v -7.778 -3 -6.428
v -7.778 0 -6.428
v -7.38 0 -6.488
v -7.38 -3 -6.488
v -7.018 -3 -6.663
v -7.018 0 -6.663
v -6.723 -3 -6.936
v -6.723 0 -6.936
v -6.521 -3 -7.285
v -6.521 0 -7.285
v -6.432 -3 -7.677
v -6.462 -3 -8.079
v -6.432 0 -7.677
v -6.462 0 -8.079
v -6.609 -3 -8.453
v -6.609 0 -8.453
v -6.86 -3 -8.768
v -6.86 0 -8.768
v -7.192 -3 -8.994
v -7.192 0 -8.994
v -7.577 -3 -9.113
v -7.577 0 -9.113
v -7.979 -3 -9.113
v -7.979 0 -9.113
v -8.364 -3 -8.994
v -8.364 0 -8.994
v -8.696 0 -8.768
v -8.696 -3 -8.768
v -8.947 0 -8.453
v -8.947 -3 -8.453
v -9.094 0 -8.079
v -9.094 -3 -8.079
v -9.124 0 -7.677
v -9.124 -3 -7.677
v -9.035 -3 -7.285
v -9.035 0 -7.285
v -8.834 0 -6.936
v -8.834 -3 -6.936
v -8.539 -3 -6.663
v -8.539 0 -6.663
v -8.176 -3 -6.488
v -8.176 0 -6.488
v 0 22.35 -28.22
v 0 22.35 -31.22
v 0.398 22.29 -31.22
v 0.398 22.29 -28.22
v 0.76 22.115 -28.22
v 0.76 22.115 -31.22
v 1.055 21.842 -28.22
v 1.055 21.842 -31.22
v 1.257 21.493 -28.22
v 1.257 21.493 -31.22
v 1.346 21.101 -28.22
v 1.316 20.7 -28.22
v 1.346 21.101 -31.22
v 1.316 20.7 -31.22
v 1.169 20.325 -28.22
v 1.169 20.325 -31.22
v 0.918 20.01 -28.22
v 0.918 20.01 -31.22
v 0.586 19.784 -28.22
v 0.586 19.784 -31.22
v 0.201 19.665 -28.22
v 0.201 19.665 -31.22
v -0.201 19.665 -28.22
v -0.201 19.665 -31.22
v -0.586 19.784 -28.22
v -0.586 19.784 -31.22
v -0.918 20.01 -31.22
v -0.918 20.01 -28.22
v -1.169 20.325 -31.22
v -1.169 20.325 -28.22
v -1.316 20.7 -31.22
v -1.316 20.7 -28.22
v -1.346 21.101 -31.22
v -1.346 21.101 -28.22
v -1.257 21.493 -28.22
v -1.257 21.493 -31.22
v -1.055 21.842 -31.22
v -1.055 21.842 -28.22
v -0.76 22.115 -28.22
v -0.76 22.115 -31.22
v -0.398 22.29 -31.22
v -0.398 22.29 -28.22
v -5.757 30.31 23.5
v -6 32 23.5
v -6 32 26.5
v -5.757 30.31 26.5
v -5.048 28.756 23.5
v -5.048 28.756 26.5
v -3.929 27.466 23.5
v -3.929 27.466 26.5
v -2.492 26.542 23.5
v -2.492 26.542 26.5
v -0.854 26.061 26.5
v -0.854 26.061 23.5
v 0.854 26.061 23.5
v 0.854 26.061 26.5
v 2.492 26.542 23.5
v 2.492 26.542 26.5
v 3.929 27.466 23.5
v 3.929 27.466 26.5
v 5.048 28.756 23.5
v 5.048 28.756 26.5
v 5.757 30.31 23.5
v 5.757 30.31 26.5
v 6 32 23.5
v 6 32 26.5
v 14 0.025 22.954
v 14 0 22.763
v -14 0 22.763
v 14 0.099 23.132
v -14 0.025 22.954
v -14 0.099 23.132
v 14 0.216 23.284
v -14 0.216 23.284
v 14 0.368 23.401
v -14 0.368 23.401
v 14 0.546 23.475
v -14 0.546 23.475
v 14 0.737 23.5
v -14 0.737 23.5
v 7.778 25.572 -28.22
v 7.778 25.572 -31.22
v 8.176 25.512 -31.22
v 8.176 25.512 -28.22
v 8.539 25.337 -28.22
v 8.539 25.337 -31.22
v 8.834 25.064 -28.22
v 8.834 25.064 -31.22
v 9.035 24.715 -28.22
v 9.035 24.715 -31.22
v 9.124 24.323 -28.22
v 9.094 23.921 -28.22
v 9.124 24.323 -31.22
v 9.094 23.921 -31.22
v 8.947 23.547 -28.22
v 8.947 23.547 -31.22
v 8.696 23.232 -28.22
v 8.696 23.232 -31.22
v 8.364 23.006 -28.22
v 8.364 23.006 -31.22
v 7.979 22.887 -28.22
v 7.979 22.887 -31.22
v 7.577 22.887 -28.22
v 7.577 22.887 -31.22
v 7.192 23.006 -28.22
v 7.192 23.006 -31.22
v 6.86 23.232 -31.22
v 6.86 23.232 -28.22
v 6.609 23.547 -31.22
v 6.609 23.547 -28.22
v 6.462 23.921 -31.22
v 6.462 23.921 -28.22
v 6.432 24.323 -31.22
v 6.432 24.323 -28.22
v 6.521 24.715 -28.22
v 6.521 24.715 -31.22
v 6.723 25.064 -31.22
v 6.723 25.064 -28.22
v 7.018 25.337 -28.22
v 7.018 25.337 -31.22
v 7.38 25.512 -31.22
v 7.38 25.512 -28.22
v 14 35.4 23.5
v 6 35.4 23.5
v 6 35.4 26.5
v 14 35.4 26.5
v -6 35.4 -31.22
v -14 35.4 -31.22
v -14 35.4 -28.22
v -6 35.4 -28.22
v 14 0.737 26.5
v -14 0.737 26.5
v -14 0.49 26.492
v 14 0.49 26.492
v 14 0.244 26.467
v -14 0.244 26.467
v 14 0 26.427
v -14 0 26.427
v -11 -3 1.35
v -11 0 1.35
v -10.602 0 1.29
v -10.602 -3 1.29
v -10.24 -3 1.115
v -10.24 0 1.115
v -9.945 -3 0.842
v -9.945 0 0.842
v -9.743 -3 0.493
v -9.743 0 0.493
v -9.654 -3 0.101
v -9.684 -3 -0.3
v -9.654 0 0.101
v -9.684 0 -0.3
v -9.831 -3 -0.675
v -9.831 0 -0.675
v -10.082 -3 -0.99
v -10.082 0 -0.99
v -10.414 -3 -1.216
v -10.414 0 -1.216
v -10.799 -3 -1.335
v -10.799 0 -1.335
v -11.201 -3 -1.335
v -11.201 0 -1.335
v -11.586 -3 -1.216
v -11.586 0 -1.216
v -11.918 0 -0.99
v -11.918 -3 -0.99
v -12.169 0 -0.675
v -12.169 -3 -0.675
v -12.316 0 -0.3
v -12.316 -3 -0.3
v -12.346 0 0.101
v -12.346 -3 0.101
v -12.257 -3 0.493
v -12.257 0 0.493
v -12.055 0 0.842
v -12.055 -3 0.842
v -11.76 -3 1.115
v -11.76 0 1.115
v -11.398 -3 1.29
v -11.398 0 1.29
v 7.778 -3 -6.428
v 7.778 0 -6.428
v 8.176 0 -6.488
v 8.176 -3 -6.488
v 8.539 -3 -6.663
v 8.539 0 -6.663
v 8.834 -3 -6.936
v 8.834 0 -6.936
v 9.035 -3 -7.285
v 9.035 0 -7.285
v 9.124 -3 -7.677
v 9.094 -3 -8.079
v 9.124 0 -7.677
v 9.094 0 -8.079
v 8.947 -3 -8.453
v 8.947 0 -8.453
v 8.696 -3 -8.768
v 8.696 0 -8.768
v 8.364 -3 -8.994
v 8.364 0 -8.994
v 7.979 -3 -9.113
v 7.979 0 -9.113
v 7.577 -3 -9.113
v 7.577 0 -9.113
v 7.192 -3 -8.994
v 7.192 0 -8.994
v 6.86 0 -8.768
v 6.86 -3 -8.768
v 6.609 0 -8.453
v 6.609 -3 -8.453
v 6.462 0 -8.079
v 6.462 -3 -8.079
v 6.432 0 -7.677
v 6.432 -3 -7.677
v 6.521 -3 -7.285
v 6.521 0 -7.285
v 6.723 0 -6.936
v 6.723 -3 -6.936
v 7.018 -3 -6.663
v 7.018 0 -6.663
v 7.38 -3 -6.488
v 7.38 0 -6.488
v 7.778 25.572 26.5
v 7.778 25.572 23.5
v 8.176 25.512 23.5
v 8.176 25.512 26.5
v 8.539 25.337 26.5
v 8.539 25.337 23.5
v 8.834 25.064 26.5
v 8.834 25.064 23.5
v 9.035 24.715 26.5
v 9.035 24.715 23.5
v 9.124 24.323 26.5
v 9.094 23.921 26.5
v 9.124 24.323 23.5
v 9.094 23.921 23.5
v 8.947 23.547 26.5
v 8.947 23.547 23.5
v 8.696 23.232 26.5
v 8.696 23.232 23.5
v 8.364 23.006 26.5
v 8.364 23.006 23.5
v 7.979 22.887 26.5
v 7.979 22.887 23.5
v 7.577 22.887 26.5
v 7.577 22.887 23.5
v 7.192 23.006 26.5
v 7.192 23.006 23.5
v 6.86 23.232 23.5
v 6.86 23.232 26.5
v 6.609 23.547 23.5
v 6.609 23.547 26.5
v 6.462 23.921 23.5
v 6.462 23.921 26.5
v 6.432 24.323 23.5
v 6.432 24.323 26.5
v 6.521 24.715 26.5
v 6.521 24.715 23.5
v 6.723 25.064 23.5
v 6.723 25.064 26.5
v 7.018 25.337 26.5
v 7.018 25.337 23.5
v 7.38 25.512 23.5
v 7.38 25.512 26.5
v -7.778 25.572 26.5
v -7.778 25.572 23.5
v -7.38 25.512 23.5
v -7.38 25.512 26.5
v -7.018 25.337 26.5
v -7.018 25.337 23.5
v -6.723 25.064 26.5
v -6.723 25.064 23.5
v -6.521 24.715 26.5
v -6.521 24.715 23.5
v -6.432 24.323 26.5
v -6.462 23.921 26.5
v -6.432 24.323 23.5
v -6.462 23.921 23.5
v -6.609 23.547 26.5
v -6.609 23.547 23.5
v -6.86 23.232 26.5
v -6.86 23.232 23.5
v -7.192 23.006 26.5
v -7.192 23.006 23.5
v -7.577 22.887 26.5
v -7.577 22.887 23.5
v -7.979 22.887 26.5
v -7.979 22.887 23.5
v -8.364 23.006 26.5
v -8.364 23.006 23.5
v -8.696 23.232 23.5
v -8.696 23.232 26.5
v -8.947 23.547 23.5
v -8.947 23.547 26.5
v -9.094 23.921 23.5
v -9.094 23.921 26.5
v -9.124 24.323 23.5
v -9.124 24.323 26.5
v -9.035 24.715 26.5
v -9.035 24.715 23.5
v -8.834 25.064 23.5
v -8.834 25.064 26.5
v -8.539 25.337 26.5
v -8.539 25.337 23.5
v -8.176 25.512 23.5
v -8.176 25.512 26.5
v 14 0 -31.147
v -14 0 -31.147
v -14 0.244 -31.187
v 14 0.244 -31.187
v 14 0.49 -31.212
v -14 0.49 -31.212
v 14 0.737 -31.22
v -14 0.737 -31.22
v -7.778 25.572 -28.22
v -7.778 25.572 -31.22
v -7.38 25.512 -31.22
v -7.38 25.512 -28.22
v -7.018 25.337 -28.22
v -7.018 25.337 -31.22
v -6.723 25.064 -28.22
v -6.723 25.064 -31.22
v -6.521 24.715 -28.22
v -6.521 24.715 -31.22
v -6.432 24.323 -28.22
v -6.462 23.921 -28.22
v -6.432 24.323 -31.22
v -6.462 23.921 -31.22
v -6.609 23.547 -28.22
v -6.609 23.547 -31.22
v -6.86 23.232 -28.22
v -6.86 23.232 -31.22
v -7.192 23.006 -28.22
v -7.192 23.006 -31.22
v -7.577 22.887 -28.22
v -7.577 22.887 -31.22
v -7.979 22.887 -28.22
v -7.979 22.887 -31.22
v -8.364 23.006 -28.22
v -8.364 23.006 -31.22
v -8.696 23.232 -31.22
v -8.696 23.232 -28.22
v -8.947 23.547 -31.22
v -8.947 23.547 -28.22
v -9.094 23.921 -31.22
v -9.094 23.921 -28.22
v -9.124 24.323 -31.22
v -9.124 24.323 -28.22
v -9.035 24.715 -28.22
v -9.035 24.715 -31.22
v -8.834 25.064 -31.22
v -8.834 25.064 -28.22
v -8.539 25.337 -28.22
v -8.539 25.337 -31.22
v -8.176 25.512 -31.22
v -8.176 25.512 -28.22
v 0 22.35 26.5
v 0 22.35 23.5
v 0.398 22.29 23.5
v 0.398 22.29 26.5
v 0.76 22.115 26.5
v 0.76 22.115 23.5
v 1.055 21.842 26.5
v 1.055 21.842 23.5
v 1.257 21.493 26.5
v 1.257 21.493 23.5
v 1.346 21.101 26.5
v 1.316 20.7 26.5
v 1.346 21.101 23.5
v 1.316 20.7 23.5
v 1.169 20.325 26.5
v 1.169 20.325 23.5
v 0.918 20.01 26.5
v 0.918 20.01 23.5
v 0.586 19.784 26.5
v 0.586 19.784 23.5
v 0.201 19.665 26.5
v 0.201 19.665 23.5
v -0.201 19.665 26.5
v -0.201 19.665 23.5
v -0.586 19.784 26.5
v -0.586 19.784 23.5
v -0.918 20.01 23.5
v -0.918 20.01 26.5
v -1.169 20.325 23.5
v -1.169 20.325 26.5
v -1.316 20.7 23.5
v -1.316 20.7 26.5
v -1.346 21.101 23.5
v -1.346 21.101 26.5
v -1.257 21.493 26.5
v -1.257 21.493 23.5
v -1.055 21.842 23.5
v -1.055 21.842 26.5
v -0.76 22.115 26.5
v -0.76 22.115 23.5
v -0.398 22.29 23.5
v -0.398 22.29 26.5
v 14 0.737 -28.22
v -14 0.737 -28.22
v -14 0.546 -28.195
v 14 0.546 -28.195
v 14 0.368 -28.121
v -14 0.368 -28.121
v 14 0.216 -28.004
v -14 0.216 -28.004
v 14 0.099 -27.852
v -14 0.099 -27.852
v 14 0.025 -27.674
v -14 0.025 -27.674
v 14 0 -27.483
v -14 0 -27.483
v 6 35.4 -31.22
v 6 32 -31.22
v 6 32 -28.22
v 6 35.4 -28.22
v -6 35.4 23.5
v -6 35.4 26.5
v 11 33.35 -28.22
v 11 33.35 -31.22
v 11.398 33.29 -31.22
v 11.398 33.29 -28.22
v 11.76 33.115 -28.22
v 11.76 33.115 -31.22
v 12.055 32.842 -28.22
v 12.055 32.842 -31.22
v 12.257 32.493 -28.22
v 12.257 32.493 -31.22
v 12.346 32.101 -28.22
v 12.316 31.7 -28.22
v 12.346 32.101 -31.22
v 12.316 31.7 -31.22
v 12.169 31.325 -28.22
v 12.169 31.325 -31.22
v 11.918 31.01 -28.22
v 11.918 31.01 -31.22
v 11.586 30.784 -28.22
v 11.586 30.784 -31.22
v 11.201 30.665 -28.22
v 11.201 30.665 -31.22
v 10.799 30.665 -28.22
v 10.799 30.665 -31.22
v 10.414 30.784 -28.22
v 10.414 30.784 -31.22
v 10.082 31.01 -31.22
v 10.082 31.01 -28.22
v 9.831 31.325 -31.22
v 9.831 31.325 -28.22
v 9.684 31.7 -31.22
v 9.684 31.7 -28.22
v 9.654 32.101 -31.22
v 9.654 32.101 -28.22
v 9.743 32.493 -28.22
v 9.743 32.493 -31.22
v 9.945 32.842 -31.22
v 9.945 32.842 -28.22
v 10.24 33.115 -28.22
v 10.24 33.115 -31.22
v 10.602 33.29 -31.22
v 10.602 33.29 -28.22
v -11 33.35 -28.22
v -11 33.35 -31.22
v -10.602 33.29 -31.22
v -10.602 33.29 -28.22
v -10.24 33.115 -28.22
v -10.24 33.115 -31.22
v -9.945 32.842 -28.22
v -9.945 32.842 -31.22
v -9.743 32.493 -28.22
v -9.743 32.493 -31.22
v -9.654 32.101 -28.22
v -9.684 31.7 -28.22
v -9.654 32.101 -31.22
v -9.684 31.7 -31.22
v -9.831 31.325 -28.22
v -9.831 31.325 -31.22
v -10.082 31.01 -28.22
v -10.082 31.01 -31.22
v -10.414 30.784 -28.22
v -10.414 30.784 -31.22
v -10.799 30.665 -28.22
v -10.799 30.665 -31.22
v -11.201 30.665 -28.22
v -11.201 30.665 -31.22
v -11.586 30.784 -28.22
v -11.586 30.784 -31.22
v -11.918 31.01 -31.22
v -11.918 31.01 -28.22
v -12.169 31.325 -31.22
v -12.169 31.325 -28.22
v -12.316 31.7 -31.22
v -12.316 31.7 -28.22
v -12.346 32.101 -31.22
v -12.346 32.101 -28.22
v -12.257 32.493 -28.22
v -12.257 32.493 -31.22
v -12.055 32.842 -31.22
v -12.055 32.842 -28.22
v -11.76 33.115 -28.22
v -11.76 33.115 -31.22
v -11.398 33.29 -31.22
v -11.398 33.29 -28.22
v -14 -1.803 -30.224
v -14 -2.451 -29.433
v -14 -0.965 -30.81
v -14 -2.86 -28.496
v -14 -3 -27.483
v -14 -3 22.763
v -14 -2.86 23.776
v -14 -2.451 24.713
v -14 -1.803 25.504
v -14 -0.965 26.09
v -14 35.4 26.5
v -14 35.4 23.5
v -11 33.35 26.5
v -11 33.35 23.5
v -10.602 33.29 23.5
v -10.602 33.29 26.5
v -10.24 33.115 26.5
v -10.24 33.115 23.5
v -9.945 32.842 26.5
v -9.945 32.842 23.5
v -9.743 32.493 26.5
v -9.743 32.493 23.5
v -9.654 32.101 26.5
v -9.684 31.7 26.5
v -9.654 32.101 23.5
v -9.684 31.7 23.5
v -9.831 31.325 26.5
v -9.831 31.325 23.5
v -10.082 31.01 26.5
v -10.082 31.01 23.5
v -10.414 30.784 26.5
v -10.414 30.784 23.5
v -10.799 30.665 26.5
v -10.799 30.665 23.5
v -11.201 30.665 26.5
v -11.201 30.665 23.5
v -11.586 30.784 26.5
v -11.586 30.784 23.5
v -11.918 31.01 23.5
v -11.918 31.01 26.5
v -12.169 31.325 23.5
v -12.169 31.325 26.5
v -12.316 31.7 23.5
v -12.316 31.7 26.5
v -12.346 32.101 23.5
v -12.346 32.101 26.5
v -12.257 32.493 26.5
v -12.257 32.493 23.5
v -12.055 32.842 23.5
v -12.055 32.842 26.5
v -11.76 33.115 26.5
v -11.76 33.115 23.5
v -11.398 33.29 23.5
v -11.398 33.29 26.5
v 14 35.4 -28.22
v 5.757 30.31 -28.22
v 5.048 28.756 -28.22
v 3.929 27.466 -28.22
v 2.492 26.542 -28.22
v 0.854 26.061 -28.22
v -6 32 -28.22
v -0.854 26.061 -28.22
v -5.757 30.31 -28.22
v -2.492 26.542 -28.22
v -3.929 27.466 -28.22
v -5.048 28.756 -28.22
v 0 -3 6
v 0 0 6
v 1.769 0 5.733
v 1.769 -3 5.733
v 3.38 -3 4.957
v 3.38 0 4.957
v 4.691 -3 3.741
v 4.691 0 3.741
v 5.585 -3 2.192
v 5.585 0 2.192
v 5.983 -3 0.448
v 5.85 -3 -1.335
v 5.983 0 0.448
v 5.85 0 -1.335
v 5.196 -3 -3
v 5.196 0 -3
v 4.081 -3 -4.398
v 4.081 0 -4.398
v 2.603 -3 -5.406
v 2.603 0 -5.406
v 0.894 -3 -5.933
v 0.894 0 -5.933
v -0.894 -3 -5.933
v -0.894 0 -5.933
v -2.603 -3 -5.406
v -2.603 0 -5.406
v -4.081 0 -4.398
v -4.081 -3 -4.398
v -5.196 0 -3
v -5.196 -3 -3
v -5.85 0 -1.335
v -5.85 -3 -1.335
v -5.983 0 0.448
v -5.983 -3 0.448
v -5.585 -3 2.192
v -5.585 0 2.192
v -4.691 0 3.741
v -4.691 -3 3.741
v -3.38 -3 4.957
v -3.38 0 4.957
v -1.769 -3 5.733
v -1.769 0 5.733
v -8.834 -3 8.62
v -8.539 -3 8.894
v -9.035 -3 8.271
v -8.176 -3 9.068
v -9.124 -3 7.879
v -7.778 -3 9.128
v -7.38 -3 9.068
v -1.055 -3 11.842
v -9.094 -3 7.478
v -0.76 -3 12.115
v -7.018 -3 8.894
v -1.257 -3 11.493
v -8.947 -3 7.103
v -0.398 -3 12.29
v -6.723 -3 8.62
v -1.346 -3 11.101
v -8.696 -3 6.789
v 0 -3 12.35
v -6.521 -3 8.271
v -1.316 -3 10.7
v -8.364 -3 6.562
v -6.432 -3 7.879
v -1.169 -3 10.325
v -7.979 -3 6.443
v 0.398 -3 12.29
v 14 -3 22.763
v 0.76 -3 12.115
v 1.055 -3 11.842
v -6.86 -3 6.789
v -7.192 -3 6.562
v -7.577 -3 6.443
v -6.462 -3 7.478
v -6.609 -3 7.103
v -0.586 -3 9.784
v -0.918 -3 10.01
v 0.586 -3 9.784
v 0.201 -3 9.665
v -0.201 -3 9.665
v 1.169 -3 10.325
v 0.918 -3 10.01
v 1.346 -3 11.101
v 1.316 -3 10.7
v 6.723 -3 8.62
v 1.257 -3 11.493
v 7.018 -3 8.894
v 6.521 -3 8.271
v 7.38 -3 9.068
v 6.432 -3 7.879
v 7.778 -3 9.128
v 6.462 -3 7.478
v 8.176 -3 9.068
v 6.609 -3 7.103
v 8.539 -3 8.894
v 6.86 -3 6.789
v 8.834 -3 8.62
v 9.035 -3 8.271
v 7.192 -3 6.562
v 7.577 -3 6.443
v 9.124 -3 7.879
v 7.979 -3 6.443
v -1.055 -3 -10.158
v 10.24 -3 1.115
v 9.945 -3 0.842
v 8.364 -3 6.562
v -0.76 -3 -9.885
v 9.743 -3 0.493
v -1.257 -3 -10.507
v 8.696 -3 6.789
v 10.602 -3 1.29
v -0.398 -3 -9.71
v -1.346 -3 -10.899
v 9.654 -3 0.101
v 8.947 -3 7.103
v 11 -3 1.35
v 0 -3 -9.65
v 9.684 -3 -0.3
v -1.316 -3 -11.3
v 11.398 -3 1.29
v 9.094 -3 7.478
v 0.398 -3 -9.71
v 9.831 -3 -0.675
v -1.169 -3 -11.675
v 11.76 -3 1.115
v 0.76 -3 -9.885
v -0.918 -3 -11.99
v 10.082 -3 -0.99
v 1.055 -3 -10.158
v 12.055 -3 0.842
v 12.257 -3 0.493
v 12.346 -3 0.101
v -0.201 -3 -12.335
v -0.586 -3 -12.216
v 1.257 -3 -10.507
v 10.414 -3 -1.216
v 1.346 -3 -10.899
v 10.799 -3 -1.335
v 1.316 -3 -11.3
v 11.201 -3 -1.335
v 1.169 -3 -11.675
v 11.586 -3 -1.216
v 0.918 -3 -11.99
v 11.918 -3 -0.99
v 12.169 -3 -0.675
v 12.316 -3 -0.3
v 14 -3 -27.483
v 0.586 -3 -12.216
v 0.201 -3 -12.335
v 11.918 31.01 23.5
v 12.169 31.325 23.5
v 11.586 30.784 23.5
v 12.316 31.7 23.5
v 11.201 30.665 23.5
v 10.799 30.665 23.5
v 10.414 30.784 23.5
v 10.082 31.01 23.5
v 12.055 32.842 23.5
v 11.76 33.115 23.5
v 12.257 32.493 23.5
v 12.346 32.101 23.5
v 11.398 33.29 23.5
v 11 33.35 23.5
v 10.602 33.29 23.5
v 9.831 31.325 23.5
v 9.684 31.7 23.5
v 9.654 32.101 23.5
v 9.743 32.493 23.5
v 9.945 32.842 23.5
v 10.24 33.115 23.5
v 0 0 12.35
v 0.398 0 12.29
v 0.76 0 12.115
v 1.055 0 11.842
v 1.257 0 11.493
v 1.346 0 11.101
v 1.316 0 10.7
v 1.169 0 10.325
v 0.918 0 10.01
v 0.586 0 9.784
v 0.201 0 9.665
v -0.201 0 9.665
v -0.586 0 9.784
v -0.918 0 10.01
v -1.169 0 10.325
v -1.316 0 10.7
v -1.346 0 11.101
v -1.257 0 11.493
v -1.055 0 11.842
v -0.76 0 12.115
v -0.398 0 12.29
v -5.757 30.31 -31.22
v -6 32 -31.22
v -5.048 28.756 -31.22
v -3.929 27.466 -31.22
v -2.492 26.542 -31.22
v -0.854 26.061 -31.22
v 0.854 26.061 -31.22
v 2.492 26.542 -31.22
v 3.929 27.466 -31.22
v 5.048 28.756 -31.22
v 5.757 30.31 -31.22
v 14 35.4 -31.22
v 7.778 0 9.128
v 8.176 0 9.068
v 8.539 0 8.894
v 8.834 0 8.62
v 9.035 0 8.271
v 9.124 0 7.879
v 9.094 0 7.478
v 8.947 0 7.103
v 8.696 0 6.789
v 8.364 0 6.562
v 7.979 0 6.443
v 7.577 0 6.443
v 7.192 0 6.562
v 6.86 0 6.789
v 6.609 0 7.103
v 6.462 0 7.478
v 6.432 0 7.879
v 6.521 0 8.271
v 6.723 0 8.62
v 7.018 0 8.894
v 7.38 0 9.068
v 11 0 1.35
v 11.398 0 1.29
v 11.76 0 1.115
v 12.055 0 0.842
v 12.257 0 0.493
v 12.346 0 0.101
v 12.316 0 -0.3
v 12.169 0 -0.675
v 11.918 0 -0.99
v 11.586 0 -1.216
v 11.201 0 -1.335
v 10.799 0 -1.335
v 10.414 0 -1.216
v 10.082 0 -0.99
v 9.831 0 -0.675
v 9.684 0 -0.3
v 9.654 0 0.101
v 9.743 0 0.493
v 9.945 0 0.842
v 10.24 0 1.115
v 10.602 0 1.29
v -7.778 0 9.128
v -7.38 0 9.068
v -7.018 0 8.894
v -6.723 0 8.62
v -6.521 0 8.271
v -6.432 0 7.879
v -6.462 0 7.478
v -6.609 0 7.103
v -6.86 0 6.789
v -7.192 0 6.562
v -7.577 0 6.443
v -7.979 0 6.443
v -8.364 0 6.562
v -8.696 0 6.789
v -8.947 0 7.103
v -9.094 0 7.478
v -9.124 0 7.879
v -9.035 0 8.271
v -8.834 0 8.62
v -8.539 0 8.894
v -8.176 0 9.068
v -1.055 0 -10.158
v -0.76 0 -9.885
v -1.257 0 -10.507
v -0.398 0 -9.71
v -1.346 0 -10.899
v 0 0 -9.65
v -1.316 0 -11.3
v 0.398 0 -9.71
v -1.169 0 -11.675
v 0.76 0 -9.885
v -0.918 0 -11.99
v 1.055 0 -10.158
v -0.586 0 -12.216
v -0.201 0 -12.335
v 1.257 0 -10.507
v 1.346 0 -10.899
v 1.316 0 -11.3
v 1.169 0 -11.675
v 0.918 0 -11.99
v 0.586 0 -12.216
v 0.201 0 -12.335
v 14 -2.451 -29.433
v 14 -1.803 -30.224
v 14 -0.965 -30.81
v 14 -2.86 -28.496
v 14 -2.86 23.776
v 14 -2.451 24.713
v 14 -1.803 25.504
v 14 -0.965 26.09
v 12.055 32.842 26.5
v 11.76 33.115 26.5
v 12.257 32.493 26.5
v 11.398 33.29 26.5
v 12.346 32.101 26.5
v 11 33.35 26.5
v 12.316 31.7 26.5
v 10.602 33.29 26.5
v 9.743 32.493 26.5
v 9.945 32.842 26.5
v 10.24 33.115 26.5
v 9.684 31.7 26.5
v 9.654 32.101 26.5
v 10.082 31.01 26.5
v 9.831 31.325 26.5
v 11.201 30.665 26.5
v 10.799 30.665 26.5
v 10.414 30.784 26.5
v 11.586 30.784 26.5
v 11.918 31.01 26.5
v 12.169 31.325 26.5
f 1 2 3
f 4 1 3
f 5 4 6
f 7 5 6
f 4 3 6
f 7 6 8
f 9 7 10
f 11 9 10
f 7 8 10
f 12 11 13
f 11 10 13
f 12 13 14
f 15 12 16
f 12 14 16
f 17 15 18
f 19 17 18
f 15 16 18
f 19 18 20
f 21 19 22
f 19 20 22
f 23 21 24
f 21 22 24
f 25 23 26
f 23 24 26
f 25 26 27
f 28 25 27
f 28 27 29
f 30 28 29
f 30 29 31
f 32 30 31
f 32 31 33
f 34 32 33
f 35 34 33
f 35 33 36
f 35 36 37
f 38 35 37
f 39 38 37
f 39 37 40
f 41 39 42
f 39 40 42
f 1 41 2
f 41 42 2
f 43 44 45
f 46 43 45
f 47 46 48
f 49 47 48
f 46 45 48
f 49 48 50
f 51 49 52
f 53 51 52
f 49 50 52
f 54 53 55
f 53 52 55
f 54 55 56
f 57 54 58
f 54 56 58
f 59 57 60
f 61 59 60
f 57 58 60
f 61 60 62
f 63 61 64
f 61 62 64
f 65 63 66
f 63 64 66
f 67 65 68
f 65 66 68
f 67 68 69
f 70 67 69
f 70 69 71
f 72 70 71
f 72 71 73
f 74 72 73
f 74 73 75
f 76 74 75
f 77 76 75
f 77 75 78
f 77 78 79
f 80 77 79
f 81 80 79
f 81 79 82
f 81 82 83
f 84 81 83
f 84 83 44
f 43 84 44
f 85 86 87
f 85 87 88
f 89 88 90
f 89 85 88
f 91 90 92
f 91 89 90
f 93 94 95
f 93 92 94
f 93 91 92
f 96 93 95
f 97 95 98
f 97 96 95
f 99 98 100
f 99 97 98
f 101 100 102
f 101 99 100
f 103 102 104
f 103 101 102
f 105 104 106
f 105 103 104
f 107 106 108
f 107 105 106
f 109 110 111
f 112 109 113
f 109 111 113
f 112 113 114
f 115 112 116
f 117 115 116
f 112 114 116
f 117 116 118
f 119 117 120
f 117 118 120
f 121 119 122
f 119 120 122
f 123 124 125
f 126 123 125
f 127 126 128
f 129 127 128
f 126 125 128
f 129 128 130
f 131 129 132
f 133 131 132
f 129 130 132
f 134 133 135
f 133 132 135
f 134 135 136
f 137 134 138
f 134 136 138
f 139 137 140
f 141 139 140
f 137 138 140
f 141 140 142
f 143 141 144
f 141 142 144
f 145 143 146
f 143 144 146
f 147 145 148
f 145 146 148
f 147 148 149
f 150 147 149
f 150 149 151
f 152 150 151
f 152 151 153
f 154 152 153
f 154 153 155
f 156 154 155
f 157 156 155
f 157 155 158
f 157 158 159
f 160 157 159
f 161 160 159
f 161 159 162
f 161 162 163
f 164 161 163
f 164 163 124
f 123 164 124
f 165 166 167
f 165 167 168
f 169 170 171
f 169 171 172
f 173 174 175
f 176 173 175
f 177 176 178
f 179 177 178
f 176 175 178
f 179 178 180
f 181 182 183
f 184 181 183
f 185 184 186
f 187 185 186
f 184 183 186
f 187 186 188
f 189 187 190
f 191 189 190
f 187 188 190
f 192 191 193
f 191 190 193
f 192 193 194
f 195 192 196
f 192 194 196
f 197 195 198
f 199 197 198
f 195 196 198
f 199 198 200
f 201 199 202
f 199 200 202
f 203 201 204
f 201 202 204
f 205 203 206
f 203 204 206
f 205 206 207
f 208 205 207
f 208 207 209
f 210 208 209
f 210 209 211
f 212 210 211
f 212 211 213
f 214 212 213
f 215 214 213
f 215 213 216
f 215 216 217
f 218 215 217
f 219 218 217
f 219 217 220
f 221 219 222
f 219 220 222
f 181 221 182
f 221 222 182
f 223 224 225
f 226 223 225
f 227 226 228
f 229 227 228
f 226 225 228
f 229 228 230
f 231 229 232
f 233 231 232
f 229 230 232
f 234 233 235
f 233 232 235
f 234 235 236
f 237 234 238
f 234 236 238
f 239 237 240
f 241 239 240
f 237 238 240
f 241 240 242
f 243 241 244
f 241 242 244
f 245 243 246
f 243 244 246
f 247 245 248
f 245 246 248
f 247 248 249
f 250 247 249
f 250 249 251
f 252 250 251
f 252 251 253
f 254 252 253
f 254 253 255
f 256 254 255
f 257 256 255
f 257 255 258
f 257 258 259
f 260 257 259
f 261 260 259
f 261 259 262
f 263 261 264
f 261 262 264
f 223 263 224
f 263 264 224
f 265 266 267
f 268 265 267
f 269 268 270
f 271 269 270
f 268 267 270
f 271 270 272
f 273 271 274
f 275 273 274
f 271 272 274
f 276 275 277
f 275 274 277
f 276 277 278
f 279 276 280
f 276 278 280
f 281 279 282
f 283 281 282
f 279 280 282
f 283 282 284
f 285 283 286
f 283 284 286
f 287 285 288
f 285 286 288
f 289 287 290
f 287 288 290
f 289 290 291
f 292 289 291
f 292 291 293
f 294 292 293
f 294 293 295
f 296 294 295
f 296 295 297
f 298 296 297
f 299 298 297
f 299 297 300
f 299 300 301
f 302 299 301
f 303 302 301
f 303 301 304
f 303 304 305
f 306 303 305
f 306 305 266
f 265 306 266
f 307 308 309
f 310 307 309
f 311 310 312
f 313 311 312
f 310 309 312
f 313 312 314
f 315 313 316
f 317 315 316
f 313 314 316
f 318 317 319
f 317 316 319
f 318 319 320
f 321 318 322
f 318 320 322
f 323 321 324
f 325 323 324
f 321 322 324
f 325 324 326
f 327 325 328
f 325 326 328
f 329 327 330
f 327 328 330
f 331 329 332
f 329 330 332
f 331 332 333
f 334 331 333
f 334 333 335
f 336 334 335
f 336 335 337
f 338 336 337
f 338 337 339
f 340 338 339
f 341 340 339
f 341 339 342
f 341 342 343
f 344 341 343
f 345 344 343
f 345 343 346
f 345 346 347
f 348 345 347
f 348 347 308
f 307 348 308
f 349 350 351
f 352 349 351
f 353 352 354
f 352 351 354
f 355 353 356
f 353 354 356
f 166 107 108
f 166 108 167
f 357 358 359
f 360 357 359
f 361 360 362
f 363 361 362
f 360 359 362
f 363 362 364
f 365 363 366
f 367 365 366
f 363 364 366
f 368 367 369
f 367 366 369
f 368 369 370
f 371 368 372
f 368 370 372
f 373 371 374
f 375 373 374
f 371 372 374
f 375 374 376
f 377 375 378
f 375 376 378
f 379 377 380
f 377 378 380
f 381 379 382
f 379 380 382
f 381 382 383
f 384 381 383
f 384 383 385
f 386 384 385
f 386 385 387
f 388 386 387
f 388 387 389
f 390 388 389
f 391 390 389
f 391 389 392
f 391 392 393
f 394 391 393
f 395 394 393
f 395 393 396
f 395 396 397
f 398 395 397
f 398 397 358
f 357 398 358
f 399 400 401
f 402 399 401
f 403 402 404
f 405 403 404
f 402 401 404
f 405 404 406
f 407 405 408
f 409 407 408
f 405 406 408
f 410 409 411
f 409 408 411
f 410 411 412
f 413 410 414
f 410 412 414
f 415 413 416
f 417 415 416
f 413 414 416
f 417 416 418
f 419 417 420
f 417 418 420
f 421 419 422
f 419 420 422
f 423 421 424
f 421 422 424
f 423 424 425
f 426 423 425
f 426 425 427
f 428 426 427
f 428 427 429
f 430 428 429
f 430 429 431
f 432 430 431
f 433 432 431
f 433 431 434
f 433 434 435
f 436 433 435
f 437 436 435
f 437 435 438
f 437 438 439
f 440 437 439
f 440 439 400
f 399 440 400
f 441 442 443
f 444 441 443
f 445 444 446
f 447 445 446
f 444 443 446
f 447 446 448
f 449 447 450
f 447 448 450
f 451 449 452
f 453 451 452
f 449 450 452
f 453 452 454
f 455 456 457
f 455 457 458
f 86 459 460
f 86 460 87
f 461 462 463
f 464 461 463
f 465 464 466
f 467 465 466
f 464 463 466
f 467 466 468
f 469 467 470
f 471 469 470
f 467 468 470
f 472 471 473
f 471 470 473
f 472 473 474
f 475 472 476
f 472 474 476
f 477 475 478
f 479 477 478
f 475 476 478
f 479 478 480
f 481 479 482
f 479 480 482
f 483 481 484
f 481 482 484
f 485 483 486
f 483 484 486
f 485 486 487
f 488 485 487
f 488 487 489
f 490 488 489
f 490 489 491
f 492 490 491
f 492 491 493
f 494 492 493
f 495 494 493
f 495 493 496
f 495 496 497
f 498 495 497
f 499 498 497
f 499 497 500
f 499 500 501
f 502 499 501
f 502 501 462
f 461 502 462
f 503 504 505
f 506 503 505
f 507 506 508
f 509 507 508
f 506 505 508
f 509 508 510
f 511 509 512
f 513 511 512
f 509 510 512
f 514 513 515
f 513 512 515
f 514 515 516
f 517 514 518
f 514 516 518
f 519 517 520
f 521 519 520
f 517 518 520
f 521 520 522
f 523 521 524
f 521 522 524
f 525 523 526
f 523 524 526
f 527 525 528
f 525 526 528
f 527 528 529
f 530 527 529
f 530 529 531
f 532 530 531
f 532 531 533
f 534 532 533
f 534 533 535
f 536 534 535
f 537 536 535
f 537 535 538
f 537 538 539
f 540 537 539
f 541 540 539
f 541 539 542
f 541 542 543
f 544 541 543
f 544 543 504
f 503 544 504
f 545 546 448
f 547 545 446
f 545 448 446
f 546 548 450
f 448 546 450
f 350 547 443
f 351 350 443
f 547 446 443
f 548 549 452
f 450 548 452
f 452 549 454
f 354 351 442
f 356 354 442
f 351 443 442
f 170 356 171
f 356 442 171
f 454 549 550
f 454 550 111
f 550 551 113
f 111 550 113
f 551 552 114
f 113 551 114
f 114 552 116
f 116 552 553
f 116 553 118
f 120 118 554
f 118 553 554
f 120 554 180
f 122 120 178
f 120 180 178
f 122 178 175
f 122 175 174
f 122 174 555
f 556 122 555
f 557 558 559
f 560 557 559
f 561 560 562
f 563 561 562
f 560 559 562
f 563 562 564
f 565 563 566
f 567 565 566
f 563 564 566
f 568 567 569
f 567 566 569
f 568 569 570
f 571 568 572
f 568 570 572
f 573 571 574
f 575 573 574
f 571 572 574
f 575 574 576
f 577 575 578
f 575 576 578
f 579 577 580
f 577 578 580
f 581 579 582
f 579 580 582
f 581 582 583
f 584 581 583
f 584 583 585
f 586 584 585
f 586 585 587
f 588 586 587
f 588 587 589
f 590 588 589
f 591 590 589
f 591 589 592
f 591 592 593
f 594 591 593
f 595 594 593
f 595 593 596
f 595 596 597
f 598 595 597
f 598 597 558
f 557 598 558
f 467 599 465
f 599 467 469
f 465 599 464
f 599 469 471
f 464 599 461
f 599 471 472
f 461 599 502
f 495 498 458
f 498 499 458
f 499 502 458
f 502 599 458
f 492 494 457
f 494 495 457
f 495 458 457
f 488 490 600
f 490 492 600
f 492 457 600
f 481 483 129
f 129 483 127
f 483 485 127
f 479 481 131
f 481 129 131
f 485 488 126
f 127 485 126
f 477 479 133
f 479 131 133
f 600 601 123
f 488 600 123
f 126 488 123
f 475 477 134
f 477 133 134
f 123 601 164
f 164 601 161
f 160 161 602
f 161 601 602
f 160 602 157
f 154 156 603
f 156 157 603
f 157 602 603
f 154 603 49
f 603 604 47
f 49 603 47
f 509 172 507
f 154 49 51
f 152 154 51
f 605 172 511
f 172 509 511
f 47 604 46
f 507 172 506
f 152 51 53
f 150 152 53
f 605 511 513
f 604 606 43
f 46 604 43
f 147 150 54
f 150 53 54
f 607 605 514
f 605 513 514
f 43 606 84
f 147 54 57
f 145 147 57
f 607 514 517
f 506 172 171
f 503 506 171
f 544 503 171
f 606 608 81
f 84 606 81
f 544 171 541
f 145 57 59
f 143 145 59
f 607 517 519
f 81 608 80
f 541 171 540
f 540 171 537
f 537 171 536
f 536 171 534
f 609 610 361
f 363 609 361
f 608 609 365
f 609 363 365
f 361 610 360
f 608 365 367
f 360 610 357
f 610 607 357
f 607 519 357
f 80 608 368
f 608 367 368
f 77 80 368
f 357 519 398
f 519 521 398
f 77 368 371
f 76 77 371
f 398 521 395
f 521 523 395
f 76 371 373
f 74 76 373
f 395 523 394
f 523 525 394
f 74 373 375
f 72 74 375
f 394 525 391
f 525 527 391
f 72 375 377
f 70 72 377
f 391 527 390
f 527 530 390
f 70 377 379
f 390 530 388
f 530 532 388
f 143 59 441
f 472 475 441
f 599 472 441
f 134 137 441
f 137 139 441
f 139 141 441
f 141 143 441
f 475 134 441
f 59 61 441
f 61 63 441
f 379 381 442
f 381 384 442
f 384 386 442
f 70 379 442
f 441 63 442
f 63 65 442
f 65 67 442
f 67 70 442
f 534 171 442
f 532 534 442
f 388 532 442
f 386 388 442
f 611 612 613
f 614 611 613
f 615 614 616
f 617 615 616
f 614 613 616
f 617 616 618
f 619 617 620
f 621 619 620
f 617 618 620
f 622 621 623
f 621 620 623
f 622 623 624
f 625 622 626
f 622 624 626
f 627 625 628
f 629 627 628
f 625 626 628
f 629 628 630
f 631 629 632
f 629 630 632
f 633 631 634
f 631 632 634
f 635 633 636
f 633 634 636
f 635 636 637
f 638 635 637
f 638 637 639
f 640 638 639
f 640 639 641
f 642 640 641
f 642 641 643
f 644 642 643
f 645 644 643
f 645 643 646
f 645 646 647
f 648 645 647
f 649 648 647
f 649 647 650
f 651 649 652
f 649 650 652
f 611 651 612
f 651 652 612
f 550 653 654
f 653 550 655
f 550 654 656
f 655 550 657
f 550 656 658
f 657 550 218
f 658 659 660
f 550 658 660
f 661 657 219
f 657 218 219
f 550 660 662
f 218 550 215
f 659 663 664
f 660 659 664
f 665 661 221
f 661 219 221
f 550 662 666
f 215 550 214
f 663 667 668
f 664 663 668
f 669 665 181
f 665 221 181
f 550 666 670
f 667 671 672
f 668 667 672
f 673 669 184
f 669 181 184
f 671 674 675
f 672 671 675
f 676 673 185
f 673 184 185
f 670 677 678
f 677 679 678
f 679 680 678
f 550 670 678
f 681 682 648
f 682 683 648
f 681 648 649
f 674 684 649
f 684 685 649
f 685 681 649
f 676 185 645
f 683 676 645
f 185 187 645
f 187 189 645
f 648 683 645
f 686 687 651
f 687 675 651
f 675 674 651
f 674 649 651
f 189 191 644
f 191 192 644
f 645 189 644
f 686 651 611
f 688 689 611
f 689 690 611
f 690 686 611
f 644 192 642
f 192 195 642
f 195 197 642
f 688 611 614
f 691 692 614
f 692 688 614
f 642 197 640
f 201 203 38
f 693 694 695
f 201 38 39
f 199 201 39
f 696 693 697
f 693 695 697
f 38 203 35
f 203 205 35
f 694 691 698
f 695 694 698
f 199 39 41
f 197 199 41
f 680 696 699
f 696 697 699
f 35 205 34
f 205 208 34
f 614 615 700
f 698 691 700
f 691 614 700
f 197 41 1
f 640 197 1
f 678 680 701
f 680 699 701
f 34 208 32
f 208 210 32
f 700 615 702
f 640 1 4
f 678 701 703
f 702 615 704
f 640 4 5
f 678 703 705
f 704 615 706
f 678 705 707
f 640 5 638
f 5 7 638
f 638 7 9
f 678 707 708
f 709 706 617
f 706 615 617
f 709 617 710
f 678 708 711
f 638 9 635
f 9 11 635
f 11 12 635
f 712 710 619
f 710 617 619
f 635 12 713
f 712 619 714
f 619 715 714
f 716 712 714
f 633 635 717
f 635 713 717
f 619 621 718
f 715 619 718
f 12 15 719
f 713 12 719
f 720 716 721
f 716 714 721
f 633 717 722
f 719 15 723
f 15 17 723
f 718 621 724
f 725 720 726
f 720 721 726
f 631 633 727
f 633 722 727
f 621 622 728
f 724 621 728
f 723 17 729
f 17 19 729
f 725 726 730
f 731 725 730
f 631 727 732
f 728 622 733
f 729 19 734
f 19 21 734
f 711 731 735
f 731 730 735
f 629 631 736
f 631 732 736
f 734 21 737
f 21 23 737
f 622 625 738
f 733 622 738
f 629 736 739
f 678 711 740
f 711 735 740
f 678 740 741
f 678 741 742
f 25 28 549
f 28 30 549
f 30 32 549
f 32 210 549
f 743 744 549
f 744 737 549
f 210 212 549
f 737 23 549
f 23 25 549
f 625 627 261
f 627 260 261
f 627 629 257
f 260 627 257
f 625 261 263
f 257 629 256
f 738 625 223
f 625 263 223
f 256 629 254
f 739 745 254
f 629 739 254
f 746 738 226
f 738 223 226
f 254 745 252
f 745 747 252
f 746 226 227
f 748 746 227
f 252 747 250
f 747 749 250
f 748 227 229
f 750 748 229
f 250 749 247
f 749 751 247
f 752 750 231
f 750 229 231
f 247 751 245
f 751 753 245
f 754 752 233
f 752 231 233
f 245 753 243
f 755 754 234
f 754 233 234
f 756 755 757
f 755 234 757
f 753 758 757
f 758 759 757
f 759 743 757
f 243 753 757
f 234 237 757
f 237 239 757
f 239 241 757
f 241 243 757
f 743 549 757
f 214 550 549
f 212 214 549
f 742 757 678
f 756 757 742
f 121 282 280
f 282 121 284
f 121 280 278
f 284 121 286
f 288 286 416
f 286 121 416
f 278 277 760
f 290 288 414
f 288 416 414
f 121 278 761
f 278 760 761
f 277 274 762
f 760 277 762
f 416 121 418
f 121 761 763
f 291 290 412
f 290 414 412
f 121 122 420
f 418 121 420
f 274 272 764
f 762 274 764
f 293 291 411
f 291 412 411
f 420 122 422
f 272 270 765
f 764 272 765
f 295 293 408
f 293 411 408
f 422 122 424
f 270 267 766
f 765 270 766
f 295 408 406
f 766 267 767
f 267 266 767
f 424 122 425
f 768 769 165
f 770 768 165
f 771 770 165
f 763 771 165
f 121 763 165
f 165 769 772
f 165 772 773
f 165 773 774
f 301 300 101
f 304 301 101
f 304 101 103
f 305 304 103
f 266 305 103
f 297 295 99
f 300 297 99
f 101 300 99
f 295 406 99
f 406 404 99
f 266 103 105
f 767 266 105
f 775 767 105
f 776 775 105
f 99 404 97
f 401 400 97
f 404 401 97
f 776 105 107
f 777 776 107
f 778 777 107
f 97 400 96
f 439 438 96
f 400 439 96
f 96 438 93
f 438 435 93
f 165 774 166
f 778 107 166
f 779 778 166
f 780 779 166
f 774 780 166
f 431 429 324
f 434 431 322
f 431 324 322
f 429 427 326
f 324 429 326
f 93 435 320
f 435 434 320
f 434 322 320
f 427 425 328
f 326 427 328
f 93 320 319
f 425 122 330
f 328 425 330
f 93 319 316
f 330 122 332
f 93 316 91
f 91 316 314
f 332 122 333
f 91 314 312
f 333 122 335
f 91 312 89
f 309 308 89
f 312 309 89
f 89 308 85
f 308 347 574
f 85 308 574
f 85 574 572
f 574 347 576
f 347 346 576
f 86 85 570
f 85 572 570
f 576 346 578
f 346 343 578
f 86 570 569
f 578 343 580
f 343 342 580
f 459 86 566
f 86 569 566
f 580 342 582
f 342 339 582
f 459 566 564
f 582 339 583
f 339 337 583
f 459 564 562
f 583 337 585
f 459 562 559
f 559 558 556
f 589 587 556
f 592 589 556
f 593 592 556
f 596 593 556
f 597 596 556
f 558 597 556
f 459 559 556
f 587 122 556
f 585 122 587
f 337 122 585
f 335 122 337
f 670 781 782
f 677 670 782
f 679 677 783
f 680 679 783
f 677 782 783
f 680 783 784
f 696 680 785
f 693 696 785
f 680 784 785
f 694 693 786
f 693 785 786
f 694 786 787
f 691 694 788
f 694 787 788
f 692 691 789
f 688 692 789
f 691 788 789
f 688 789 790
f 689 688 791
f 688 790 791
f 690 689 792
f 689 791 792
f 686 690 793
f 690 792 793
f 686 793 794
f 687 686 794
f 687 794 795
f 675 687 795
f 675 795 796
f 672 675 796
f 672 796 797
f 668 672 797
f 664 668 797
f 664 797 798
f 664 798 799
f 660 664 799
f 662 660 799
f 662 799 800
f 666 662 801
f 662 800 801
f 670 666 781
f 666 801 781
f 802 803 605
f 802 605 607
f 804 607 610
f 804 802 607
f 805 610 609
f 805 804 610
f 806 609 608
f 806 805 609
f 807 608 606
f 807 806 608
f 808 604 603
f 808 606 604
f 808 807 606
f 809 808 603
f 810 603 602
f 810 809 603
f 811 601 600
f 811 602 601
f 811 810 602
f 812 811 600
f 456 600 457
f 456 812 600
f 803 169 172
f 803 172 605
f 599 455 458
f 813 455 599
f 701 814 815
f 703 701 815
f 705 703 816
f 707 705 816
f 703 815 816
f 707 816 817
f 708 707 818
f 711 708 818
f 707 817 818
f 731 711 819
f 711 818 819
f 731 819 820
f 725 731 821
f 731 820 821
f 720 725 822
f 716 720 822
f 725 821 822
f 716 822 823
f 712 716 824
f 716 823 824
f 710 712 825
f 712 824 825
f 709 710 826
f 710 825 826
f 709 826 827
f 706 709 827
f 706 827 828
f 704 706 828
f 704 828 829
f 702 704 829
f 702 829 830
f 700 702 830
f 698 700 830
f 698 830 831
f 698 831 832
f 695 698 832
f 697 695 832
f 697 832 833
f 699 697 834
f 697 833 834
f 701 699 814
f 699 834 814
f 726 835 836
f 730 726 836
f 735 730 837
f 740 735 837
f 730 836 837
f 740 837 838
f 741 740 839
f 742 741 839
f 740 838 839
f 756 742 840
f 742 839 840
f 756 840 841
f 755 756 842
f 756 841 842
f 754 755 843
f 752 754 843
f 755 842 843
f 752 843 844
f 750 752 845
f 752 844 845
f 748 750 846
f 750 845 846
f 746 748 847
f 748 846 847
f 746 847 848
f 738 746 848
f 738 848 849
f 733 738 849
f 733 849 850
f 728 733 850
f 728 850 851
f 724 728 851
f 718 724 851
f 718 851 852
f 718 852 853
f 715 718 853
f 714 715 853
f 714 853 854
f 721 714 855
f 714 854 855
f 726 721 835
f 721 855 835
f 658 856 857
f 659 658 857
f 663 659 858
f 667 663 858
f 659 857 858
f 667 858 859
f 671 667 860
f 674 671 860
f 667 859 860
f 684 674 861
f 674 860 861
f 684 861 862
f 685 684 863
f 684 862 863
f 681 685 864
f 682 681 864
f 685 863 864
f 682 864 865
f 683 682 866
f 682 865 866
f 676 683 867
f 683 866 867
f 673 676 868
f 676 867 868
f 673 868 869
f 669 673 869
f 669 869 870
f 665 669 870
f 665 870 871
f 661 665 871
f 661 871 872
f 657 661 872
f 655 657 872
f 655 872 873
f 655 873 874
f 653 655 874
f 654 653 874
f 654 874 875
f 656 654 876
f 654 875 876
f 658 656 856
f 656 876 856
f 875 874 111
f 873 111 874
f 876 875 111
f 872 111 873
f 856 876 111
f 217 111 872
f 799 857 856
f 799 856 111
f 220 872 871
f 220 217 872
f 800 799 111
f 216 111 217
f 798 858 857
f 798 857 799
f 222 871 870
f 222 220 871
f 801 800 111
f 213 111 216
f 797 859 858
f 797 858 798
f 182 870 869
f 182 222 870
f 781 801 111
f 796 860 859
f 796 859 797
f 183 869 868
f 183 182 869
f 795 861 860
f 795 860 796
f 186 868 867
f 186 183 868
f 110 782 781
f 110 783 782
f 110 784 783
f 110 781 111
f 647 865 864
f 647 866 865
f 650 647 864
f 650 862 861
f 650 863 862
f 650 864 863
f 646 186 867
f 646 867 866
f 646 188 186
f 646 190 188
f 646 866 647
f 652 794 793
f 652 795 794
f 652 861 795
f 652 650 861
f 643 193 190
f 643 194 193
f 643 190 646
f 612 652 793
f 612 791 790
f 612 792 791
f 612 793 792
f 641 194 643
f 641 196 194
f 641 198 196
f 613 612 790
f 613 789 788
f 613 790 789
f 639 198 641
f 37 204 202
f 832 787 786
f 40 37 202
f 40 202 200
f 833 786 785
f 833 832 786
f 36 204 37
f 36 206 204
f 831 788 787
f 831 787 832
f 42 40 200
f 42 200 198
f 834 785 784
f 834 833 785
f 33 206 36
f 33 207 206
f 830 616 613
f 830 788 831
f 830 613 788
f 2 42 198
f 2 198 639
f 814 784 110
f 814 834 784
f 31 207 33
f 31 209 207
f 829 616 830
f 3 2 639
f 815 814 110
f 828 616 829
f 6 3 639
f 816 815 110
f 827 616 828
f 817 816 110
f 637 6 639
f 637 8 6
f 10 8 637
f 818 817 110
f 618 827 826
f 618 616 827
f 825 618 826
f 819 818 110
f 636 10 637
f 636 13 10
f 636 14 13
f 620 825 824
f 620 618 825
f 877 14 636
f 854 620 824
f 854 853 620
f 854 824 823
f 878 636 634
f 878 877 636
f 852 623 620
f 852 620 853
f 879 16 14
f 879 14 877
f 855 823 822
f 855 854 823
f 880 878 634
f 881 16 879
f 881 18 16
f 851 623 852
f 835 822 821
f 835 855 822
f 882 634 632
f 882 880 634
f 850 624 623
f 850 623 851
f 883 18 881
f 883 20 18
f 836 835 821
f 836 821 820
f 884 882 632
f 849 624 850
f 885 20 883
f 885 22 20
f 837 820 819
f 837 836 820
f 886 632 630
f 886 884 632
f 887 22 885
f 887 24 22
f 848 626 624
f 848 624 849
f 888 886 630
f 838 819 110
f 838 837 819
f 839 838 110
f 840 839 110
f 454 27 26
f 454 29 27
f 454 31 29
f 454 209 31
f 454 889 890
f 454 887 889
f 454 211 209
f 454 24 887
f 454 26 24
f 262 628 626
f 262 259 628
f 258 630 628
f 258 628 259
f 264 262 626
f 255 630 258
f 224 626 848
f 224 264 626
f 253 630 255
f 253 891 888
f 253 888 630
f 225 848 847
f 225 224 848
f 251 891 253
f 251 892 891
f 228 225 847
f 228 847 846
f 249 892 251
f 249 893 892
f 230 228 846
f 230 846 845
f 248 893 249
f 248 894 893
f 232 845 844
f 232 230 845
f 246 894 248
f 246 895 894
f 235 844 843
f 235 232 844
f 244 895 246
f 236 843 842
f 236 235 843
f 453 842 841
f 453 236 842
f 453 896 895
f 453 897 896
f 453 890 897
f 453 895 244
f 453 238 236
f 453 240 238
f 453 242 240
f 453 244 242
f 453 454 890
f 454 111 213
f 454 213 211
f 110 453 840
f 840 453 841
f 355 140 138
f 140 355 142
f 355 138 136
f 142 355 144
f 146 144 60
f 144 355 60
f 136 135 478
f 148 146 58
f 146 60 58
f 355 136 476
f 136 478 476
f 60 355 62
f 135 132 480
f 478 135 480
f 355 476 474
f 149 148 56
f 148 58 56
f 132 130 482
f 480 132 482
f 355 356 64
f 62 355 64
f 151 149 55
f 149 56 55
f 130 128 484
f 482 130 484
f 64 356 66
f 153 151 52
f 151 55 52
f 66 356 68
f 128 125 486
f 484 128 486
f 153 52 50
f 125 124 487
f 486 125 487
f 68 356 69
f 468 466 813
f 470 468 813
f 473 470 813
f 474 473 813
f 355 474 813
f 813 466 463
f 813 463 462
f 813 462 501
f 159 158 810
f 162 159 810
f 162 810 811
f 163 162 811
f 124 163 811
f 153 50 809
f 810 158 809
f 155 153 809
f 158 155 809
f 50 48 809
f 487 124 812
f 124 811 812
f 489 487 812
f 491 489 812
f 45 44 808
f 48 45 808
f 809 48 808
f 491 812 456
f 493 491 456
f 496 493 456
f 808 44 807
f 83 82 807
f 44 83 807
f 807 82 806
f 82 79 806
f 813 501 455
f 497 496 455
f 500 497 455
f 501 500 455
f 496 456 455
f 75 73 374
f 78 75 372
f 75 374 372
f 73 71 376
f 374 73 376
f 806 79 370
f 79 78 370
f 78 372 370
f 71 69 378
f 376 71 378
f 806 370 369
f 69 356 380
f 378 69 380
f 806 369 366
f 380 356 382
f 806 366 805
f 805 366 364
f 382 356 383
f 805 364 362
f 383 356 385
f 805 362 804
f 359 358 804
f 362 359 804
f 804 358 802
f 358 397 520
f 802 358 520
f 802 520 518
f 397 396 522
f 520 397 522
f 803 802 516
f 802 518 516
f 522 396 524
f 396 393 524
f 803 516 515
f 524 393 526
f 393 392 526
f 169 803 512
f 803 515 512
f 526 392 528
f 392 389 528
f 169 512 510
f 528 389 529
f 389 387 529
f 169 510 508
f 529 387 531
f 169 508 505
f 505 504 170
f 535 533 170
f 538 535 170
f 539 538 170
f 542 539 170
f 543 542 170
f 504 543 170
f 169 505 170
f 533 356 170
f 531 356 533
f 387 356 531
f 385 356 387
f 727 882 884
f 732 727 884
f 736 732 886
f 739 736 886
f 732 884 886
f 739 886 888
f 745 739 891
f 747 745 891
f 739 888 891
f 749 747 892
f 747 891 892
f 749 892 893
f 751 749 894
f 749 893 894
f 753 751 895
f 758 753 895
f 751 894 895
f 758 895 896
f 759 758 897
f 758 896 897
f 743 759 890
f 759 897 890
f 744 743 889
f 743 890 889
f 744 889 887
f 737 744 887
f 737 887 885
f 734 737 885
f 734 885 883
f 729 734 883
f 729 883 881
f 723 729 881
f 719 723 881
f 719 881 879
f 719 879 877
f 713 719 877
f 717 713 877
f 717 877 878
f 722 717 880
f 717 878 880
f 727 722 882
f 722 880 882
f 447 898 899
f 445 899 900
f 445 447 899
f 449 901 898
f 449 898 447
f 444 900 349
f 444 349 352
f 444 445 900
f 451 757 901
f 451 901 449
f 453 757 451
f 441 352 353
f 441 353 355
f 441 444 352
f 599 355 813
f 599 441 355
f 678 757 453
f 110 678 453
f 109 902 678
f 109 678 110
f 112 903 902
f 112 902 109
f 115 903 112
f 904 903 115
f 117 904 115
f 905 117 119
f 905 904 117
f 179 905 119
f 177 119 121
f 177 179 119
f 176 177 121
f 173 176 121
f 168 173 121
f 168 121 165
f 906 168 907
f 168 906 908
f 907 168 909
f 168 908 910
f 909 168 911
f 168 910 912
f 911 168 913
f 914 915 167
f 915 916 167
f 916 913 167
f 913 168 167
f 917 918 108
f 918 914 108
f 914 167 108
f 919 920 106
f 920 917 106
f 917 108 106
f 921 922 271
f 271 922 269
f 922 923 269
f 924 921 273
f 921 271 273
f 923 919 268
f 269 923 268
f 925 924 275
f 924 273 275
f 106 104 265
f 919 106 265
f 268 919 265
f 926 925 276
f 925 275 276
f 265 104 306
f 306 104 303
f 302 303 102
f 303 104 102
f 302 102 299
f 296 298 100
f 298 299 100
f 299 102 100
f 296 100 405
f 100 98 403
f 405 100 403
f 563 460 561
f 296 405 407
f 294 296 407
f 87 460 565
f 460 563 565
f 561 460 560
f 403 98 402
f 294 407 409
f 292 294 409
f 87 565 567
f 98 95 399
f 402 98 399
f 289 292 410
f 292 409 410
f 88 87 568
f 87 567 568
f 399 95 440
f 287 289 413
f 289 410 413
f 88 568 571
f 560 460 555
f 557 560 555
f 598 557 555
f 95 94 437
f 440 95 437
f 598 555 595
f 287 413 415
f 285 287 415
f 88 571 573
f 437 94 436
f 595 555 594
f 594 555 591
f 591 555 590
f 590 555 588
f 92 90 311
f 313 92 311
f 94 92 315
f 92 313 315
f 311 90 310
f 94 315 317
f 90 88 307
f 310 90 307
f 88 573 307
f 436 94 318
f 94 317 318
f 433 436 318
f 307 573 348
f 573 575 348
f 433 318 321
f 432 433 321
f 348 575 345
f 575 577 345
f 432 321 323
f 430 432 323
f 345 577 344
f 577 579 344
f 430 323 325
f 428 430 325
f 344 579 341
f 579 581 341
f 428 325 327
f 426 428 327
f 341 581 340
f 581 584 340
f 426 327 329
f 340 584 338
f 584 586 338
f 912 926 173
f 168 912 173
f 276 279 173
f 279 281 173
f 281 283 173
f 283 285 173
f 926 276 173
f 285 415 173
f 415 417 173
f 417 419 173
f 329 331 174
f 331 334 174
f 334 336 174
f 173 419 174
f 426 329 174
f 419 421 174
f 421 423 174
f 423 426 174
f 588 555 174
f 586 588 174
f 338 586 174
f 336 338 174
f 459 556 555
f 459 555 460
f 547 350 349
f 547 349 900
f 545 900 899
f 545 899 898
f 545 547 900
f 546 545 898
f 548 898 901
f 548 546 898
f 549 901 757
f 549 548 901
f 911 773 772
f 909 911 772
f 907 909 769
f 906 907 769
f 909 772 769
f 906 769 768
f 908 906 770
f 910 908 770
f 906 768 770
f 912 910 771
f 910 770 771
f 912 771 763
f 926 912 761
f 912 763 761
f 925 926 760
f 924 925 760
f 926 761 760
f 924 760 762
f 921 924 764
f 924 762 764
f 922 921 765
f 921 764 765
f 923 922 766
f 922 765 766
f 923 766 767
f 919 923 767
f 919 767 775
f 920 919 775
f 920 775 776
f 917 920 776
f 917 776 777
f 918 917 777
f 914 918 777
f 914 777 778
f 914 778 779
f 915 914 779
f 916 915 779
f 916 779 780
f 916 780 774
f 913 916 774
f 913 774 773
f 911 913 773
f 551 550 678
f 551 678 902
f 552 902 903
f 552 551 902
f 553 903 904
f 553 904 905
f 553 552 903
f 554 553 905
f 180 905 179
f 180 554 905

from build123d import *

# Parameters (mm, degrees)
SKETCH_1_W             = 28
SKETCH_1_H             = 160
SKETCH_1_R             = 6
SKETCH_1_R_2           = 1.35
SM_BASE_FLANGE_1_DEPTH = 3
OTHER_START            = -14
OTHER_1_DEPTH          = 28
OTHER_1_2_DEPTH        = 28
SKETCH_7_R             = 1.35
CUT_EXTRUDE_1_DEPTH    = 81.582164958


# Read off the part's stored shape, not the designer's step: 绘制的折弯1
# Sheet-metal steps are written as plain solids
with BuildPart() as part:
    # Sketch 1 → 基体-法兰1 (new body)
    with BuildSketch(Plane(origin=(0, 0, 0), x_dir=(1, 0, 0), z_dir=(0, 1, 0))):
        Rectangle(SKETCH_1_W, SKETCH_1_H)
        with Locations(Location((0, 0, 0), (0, 0, 270))):
            Circle(SKETCH_1_R, mode=Mode.SUBTRACT)
        with Locations(Location((0, 11, 0), (0, 0, 270))):
            Circle(SKETCH_1_R_2, mode=Mode.SUBTRACT)
        with Locations(Location((7.778174593, 7.778174593, 0), (0, 0, 270))):
            Circle(SKETCH_1_R_2, mode=Mode.SUBTRACT)
        with Locations(Location((11, 0, 0), (0, 0, 270))):
            Circle(SKETCH_1_R_2, mode=Mode.SUBTRACT)
        with Locations(Location((7.778174593, -7.778174593, 0), (0, 0, 270))):
            Circle(SKETCH_1_R_2, mode=Mode.SUBTRACT)
        with Locations(Location((0, -11, 0), (0, 0, 270))):
            Circle(SKETCH_1_R_2, mode=Mode.SUBTRACT)
        with Locations(Location((-7.778174593, -7.778174593, 0), (0, 0, 270))):
            Circle(SKETCH_1_R_2, mode=Mode.SUBTRACT)
        with Locations(Location((-11, 0, 0), (0, 0, 270))):
            Circle(SKETCH_1_R_2, mode=Mode.SUBTRACT)
        with Locations(Location((-7.778174593, 7.778174593, 0), (0, 0, 270))):
            Circle(SKETCH_1_R_2, mode=Mode.SUBTRACT)
    extrude(amount=-SM_BASE_FLANGE_1_DEPTH)

    # Other 1 outline → Other 1 (cut)
    with BuildSketch(Plane.YZ.offset(OTHER_START)):
        with BuildLine():
            ThreePointArc((0, -31.146677222), (-2.154295979, -29.850867001), (-3, -27.4834))
            Line((-3, -27.4834), (-3, -80))
            Line((-3, -80), (0, -80))
            Line((0, -80), (0, -31.146677222))
        make_face()
        with BuildLine():
            Line((-3, 80), (-3, 22.7634))
            ThreePointArc((-3, 22.7634), (-2.154295979, 25.130867001), (0, 26.426677222))
            Line((0, 26.426677222), (0, 80))
            Line((0, 80), (-3, 80))
        make_face()
    extrude(amount=OTHER_1_DEPTH, mode=Mode.SUBTRACT)

    # Other 1 2 outline → Other 1 2 (add)
    with BuildSketch(Plane.YZ.offset(OTHER_START)):
        with BuildLine():
            Line((0, -27.4834), (0, -31.146677222))
            ThreePointArc((0, -31.146677222), (0.36647982, -31.201624121), (0.7366, -31.22))
            Line((0.7366, -31.22), (49.739956935, -31.22))
            Line((49.739956935, -31.22), (49.739956935, -28.22))
            Line((49.739956935, -28.22), (0.7366, -28.22))
            ThreePointArc((0.7366, -28.22), (0.215745145, -28.004254855), (0, -27.4834))
        make_face()
        with BuildLine():
            ThreePointArc((0.7366, 26.5), (0.36647982, 26.481624121), (0, 26.426677222))
            Line((0, 26.426677222), (0, 22.7634))
            ThreePointArc((0, 22.7634), (0.215745145, 23.284254855), (0.7366, 23.5))
            Line((0.7366, 23.5), (54.459956935, 23.5))
            Line((54.459956935, 23.5), (54.459956935, 26.5))
            Line((54.459956935, 26.5), (0.7366, 26.5))
        make_face()
    extrude(amount=OTHER_1_2_DEPTH)

    # 草图7 → 切除-拉伸1 (cut, through all)
    with BuildSketch(Plane(origin=(0, 0, -31.22), x_dir=(-1, 0, 0), z_dir=(0, 0, -1))):
        with Locations(Location((11, 32, 0), (0, 0, 90))):
            Circle(SKETCH_7_R)
        with Locations(Location((7.778174593, 24.221825407, 0), (0, 0, 90))):
            Circle(SKETCH_7_R)
        with Locations(Location((0, 21, 0), (0, 0, 90))):
            Circle(SKETCH_7_R)
        with Locations(Location((-7.778174593, 24.221825407, 0), (0, 0, 90))):
            Circle(SKETCH_7_R)
        with Locations(Location((-11, 32, 0), (0, 0, 90))):
            Circle(SKETCH_7_R)
        with BuildLine():
            Line((-14, 32), (-32.703539992, 32))
            Line((-32.703539992, 32), (-28.620805063, 56.964772816))
            Line((-28.620805063, 56.964772816), (24.538070134, 56.964772816))
            Line((24.538070134, 56.964772816), (24.538070134, 32))
            Line((24.538070134, 32), (14, 32))
            Line((14, 32), (14, 35.400052641))
            Line((14, 35.400052641), (6, 35.400052641))
            Line((6, 35.400052641), (6, 32))
            ThreePointArc((6, 32), (0, 26), (-6, 32))
            Line((-6, 32), (-6, 35.400052641))
            Line((-6, 35.400052641), (-14, 35.400052641))
            Line((-14, 35.400052641), (-14, 32))
        make_face()
    extrude(amount=-CUT_EXTRUDE_1_DEPTH, mode=Mode.SUBTRACT)


solid = part.part
